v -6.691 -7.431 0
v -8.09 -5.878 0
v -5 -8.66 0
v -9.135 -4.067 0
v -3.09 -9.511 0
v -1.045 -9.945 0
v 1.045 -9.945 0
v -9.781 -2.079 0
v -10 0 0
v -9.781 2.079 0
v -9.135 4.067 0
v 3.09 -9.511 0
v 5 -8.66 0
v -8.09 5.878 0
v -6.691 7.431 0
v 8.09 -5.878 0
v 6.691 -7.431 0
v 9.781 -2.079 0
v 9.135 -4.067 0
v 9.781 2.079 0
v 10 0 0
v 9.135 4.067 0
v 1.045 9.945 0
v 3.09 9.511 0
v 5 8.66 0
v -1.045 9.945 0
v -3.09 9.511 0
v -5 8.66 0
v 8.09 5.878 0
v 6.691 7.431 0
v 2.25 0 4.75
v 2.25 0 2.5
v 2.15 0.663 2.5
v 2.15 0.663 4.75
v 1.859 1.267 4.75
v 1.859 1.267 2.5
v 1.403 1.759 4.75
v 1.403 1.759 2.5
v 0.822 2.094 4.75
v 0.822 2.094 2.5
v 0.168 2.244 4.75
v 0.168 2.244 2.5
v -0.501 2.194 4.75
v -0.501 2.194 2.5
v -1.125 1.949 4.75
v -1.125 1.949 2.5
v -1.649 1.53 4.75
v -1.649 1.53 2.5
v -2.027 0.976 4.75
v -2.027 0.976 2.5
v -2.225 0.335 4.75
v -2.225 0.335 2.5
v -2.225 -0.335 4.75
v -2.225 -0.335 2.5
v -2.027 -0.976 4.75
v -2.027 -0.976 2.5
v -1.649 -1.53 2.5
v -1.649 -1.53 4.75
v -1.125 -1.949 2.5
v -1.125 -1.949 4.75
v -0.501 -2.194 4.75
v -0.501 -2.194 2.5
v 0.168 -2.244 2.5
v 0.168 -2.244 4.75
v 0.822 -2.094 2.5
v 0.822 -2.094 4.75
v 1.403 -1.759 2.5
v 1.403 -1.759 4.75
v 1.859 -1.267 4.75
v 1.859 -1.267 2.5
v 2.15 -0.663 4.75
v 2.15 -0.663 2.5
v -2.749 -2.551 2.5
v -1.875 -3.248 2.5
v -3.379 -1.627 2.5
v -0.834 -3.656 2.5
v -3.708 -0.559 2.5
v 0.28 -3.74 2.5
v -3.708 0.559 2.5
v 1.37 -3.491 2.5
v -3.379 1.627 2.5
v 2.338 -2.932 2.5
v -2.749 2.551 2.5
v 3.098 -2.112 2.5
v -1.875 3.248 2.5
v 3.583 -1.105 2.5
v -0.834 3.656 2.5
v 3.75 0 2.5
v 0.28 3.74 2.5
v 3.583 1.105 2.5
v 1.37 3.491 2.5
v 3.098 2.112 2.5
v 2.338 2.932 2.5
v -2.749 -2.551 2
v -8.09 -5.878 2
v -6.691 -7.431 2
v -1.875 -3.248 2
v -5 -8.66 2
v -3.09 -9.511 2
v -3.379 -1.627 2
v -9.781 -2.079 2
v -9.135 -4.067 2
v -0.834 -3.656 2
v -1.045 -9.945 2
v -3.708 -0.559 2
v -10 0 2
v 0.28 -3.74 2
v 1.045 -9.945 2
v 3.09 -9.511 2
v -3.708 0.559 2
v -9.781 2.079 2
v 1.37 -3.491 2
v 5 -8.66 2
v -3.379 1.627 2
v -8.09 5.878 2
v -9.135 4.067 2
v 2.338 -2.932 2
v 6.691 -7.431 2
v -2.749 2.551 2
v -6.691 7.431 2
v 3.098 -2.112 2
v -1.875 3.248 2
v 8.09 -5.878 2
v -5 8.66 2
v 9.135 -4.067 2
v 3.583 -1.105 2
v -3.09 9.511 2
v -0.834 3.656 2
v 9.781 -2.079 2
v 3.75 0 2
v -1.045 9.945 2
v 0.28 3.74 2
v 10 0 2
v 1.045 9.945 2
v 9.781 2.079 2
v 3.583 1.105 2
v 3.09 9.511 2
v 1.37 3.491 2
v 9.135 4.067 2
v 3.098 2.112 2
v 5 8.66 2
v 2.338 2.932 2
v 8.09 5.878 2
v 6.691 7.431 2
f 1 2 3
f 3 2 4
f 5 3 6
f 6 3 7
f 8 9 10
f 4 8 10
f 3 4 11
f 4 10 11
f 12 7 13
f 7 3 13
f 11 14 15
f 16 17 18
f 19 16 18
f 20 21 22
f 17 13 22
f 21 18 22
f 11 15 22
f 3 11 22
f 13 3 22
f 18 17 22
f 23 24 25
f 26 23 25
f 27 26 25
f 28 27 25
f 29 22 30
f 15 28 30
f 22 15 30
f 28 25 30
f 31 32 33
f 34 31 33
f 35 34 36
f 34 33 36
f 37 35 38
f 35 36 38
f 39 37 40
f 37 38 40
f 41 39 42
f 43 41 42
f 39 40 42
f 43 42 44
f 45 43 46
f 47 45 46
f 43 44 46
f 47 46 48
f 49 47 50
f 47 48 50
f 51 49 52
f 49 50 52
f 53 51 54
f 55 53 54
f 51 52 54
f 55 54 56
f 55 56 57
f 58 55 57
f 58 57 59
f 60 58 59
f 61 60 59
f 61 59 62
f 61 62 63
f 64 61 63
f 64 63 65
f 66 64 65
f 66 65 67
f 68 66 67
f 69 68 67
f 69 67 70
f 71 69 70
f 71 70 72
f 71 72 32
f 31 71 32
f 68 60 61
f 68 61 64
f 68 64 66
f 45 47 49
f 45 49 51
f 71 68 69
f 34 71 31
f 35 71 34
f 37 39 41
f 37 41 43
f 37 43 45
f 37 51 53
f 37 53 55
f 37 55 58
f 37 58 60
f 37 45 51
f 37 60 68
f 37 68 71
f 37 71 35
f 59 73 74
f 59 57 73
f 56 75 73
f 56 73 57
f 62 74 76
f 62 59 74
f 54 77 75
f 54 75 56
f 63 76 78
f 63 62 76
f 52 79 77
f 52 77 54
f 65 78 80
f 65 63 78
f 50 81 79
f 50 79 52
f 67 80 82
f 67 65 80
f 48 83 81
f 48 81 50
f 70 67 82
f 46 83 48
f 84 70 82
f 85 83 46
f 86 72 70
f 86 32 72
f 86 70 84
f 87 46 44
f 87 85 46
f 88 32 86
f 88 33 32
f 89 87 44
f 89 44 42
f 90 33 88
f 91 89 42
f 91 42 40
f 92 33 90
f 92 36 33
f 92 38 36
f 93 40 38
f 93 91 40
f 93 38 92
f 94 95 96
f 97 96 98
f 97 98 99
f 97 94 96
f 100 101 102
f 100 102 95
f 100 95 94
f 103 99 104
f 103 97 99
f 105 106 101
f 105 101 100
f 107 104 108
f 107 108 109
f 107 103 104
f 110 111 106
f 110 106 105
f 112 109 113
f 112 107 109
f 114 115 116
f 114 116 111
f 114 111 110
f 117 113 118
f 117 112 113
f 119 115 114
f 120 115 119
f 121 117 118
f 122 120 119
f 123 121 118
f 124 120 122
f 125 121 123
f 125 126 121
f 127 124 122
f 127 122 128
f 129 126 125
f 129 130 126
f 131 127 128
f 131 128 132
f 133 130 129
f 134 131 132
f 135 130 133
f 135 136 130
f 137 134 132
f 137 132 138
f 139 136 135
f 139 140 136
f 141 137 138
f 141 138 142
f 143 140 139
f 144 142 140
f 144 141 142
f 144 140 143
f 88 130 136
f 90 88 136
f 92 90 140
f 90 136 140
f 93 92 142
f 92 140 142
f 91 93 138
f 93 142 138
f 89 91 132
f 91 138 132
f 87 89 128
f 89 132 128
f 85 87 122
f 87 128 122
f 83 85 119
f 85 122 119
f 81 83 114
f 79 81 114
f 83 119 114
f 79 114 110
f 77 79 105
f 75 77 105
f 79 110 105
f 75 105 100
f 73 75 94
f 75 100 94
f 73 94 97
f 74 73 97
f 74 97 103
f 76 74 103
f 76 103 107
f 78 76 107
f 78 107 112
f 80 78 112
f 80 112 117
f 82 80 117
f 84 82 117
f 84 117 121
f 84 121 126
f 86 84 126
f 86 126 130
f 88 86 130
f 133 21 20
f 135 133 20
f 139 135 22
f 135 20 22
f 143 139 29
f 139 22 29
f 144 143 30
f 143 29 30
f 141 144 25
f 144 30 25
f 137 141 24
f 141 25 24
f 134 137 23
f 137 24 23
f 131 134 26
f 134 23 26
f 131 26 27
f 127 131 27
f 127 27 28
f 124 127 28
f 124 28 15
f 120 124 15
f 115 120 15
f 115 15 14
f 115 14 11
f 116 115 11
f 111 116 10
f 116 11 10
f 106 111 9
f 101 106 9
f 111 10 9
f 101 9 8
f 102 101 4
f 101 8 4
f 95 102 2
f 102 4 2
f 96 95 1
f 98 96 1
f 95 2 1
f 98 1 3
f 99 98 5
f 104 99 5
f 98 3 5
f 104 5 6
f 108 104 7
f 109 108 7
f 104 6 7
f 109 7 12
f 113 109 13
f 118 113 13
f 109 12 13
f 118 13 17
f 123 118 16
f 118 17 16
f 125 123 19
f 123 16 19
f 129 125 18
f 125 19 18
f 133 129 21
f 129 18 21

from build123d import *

# Parameters (mm, degrees)
F0_R     = 10
F0_R_2   = 3.75
F0_R_3   = 2.25
F1_DEPTH = 2
F2_DEPTH = 4.75
F3_DEPTH = 2.5


with BuildPart() as f1:
    # F0 (on Top) → F1 (new body)
    with BuildSketch(Plane.XY):
        Circle(F0_R)
        Circle(F0_R_2, mode=Mode.SUBTRACT)
        Circle(F0_R_2)
        Circle(F0_R_3, mode=Mode.SUBTRACT)
    extrude(amount=F1_DEPTH)

    # F0 (on Top) → F2 (join)
    with BuildSketch(Plane.XY):
        Circle(F0_R_3)
    extrude(amount=F2_DEPTH)

    # F0 (on Top) → F3 (join)
    with BuildSketch(Plane.XY):
        Circle(F0_R_2)
        Circle(F0_R_3, mode=Mode.SUBTRACT)
    extrude(amount=F3_DEPTH)


solid = f1.part
